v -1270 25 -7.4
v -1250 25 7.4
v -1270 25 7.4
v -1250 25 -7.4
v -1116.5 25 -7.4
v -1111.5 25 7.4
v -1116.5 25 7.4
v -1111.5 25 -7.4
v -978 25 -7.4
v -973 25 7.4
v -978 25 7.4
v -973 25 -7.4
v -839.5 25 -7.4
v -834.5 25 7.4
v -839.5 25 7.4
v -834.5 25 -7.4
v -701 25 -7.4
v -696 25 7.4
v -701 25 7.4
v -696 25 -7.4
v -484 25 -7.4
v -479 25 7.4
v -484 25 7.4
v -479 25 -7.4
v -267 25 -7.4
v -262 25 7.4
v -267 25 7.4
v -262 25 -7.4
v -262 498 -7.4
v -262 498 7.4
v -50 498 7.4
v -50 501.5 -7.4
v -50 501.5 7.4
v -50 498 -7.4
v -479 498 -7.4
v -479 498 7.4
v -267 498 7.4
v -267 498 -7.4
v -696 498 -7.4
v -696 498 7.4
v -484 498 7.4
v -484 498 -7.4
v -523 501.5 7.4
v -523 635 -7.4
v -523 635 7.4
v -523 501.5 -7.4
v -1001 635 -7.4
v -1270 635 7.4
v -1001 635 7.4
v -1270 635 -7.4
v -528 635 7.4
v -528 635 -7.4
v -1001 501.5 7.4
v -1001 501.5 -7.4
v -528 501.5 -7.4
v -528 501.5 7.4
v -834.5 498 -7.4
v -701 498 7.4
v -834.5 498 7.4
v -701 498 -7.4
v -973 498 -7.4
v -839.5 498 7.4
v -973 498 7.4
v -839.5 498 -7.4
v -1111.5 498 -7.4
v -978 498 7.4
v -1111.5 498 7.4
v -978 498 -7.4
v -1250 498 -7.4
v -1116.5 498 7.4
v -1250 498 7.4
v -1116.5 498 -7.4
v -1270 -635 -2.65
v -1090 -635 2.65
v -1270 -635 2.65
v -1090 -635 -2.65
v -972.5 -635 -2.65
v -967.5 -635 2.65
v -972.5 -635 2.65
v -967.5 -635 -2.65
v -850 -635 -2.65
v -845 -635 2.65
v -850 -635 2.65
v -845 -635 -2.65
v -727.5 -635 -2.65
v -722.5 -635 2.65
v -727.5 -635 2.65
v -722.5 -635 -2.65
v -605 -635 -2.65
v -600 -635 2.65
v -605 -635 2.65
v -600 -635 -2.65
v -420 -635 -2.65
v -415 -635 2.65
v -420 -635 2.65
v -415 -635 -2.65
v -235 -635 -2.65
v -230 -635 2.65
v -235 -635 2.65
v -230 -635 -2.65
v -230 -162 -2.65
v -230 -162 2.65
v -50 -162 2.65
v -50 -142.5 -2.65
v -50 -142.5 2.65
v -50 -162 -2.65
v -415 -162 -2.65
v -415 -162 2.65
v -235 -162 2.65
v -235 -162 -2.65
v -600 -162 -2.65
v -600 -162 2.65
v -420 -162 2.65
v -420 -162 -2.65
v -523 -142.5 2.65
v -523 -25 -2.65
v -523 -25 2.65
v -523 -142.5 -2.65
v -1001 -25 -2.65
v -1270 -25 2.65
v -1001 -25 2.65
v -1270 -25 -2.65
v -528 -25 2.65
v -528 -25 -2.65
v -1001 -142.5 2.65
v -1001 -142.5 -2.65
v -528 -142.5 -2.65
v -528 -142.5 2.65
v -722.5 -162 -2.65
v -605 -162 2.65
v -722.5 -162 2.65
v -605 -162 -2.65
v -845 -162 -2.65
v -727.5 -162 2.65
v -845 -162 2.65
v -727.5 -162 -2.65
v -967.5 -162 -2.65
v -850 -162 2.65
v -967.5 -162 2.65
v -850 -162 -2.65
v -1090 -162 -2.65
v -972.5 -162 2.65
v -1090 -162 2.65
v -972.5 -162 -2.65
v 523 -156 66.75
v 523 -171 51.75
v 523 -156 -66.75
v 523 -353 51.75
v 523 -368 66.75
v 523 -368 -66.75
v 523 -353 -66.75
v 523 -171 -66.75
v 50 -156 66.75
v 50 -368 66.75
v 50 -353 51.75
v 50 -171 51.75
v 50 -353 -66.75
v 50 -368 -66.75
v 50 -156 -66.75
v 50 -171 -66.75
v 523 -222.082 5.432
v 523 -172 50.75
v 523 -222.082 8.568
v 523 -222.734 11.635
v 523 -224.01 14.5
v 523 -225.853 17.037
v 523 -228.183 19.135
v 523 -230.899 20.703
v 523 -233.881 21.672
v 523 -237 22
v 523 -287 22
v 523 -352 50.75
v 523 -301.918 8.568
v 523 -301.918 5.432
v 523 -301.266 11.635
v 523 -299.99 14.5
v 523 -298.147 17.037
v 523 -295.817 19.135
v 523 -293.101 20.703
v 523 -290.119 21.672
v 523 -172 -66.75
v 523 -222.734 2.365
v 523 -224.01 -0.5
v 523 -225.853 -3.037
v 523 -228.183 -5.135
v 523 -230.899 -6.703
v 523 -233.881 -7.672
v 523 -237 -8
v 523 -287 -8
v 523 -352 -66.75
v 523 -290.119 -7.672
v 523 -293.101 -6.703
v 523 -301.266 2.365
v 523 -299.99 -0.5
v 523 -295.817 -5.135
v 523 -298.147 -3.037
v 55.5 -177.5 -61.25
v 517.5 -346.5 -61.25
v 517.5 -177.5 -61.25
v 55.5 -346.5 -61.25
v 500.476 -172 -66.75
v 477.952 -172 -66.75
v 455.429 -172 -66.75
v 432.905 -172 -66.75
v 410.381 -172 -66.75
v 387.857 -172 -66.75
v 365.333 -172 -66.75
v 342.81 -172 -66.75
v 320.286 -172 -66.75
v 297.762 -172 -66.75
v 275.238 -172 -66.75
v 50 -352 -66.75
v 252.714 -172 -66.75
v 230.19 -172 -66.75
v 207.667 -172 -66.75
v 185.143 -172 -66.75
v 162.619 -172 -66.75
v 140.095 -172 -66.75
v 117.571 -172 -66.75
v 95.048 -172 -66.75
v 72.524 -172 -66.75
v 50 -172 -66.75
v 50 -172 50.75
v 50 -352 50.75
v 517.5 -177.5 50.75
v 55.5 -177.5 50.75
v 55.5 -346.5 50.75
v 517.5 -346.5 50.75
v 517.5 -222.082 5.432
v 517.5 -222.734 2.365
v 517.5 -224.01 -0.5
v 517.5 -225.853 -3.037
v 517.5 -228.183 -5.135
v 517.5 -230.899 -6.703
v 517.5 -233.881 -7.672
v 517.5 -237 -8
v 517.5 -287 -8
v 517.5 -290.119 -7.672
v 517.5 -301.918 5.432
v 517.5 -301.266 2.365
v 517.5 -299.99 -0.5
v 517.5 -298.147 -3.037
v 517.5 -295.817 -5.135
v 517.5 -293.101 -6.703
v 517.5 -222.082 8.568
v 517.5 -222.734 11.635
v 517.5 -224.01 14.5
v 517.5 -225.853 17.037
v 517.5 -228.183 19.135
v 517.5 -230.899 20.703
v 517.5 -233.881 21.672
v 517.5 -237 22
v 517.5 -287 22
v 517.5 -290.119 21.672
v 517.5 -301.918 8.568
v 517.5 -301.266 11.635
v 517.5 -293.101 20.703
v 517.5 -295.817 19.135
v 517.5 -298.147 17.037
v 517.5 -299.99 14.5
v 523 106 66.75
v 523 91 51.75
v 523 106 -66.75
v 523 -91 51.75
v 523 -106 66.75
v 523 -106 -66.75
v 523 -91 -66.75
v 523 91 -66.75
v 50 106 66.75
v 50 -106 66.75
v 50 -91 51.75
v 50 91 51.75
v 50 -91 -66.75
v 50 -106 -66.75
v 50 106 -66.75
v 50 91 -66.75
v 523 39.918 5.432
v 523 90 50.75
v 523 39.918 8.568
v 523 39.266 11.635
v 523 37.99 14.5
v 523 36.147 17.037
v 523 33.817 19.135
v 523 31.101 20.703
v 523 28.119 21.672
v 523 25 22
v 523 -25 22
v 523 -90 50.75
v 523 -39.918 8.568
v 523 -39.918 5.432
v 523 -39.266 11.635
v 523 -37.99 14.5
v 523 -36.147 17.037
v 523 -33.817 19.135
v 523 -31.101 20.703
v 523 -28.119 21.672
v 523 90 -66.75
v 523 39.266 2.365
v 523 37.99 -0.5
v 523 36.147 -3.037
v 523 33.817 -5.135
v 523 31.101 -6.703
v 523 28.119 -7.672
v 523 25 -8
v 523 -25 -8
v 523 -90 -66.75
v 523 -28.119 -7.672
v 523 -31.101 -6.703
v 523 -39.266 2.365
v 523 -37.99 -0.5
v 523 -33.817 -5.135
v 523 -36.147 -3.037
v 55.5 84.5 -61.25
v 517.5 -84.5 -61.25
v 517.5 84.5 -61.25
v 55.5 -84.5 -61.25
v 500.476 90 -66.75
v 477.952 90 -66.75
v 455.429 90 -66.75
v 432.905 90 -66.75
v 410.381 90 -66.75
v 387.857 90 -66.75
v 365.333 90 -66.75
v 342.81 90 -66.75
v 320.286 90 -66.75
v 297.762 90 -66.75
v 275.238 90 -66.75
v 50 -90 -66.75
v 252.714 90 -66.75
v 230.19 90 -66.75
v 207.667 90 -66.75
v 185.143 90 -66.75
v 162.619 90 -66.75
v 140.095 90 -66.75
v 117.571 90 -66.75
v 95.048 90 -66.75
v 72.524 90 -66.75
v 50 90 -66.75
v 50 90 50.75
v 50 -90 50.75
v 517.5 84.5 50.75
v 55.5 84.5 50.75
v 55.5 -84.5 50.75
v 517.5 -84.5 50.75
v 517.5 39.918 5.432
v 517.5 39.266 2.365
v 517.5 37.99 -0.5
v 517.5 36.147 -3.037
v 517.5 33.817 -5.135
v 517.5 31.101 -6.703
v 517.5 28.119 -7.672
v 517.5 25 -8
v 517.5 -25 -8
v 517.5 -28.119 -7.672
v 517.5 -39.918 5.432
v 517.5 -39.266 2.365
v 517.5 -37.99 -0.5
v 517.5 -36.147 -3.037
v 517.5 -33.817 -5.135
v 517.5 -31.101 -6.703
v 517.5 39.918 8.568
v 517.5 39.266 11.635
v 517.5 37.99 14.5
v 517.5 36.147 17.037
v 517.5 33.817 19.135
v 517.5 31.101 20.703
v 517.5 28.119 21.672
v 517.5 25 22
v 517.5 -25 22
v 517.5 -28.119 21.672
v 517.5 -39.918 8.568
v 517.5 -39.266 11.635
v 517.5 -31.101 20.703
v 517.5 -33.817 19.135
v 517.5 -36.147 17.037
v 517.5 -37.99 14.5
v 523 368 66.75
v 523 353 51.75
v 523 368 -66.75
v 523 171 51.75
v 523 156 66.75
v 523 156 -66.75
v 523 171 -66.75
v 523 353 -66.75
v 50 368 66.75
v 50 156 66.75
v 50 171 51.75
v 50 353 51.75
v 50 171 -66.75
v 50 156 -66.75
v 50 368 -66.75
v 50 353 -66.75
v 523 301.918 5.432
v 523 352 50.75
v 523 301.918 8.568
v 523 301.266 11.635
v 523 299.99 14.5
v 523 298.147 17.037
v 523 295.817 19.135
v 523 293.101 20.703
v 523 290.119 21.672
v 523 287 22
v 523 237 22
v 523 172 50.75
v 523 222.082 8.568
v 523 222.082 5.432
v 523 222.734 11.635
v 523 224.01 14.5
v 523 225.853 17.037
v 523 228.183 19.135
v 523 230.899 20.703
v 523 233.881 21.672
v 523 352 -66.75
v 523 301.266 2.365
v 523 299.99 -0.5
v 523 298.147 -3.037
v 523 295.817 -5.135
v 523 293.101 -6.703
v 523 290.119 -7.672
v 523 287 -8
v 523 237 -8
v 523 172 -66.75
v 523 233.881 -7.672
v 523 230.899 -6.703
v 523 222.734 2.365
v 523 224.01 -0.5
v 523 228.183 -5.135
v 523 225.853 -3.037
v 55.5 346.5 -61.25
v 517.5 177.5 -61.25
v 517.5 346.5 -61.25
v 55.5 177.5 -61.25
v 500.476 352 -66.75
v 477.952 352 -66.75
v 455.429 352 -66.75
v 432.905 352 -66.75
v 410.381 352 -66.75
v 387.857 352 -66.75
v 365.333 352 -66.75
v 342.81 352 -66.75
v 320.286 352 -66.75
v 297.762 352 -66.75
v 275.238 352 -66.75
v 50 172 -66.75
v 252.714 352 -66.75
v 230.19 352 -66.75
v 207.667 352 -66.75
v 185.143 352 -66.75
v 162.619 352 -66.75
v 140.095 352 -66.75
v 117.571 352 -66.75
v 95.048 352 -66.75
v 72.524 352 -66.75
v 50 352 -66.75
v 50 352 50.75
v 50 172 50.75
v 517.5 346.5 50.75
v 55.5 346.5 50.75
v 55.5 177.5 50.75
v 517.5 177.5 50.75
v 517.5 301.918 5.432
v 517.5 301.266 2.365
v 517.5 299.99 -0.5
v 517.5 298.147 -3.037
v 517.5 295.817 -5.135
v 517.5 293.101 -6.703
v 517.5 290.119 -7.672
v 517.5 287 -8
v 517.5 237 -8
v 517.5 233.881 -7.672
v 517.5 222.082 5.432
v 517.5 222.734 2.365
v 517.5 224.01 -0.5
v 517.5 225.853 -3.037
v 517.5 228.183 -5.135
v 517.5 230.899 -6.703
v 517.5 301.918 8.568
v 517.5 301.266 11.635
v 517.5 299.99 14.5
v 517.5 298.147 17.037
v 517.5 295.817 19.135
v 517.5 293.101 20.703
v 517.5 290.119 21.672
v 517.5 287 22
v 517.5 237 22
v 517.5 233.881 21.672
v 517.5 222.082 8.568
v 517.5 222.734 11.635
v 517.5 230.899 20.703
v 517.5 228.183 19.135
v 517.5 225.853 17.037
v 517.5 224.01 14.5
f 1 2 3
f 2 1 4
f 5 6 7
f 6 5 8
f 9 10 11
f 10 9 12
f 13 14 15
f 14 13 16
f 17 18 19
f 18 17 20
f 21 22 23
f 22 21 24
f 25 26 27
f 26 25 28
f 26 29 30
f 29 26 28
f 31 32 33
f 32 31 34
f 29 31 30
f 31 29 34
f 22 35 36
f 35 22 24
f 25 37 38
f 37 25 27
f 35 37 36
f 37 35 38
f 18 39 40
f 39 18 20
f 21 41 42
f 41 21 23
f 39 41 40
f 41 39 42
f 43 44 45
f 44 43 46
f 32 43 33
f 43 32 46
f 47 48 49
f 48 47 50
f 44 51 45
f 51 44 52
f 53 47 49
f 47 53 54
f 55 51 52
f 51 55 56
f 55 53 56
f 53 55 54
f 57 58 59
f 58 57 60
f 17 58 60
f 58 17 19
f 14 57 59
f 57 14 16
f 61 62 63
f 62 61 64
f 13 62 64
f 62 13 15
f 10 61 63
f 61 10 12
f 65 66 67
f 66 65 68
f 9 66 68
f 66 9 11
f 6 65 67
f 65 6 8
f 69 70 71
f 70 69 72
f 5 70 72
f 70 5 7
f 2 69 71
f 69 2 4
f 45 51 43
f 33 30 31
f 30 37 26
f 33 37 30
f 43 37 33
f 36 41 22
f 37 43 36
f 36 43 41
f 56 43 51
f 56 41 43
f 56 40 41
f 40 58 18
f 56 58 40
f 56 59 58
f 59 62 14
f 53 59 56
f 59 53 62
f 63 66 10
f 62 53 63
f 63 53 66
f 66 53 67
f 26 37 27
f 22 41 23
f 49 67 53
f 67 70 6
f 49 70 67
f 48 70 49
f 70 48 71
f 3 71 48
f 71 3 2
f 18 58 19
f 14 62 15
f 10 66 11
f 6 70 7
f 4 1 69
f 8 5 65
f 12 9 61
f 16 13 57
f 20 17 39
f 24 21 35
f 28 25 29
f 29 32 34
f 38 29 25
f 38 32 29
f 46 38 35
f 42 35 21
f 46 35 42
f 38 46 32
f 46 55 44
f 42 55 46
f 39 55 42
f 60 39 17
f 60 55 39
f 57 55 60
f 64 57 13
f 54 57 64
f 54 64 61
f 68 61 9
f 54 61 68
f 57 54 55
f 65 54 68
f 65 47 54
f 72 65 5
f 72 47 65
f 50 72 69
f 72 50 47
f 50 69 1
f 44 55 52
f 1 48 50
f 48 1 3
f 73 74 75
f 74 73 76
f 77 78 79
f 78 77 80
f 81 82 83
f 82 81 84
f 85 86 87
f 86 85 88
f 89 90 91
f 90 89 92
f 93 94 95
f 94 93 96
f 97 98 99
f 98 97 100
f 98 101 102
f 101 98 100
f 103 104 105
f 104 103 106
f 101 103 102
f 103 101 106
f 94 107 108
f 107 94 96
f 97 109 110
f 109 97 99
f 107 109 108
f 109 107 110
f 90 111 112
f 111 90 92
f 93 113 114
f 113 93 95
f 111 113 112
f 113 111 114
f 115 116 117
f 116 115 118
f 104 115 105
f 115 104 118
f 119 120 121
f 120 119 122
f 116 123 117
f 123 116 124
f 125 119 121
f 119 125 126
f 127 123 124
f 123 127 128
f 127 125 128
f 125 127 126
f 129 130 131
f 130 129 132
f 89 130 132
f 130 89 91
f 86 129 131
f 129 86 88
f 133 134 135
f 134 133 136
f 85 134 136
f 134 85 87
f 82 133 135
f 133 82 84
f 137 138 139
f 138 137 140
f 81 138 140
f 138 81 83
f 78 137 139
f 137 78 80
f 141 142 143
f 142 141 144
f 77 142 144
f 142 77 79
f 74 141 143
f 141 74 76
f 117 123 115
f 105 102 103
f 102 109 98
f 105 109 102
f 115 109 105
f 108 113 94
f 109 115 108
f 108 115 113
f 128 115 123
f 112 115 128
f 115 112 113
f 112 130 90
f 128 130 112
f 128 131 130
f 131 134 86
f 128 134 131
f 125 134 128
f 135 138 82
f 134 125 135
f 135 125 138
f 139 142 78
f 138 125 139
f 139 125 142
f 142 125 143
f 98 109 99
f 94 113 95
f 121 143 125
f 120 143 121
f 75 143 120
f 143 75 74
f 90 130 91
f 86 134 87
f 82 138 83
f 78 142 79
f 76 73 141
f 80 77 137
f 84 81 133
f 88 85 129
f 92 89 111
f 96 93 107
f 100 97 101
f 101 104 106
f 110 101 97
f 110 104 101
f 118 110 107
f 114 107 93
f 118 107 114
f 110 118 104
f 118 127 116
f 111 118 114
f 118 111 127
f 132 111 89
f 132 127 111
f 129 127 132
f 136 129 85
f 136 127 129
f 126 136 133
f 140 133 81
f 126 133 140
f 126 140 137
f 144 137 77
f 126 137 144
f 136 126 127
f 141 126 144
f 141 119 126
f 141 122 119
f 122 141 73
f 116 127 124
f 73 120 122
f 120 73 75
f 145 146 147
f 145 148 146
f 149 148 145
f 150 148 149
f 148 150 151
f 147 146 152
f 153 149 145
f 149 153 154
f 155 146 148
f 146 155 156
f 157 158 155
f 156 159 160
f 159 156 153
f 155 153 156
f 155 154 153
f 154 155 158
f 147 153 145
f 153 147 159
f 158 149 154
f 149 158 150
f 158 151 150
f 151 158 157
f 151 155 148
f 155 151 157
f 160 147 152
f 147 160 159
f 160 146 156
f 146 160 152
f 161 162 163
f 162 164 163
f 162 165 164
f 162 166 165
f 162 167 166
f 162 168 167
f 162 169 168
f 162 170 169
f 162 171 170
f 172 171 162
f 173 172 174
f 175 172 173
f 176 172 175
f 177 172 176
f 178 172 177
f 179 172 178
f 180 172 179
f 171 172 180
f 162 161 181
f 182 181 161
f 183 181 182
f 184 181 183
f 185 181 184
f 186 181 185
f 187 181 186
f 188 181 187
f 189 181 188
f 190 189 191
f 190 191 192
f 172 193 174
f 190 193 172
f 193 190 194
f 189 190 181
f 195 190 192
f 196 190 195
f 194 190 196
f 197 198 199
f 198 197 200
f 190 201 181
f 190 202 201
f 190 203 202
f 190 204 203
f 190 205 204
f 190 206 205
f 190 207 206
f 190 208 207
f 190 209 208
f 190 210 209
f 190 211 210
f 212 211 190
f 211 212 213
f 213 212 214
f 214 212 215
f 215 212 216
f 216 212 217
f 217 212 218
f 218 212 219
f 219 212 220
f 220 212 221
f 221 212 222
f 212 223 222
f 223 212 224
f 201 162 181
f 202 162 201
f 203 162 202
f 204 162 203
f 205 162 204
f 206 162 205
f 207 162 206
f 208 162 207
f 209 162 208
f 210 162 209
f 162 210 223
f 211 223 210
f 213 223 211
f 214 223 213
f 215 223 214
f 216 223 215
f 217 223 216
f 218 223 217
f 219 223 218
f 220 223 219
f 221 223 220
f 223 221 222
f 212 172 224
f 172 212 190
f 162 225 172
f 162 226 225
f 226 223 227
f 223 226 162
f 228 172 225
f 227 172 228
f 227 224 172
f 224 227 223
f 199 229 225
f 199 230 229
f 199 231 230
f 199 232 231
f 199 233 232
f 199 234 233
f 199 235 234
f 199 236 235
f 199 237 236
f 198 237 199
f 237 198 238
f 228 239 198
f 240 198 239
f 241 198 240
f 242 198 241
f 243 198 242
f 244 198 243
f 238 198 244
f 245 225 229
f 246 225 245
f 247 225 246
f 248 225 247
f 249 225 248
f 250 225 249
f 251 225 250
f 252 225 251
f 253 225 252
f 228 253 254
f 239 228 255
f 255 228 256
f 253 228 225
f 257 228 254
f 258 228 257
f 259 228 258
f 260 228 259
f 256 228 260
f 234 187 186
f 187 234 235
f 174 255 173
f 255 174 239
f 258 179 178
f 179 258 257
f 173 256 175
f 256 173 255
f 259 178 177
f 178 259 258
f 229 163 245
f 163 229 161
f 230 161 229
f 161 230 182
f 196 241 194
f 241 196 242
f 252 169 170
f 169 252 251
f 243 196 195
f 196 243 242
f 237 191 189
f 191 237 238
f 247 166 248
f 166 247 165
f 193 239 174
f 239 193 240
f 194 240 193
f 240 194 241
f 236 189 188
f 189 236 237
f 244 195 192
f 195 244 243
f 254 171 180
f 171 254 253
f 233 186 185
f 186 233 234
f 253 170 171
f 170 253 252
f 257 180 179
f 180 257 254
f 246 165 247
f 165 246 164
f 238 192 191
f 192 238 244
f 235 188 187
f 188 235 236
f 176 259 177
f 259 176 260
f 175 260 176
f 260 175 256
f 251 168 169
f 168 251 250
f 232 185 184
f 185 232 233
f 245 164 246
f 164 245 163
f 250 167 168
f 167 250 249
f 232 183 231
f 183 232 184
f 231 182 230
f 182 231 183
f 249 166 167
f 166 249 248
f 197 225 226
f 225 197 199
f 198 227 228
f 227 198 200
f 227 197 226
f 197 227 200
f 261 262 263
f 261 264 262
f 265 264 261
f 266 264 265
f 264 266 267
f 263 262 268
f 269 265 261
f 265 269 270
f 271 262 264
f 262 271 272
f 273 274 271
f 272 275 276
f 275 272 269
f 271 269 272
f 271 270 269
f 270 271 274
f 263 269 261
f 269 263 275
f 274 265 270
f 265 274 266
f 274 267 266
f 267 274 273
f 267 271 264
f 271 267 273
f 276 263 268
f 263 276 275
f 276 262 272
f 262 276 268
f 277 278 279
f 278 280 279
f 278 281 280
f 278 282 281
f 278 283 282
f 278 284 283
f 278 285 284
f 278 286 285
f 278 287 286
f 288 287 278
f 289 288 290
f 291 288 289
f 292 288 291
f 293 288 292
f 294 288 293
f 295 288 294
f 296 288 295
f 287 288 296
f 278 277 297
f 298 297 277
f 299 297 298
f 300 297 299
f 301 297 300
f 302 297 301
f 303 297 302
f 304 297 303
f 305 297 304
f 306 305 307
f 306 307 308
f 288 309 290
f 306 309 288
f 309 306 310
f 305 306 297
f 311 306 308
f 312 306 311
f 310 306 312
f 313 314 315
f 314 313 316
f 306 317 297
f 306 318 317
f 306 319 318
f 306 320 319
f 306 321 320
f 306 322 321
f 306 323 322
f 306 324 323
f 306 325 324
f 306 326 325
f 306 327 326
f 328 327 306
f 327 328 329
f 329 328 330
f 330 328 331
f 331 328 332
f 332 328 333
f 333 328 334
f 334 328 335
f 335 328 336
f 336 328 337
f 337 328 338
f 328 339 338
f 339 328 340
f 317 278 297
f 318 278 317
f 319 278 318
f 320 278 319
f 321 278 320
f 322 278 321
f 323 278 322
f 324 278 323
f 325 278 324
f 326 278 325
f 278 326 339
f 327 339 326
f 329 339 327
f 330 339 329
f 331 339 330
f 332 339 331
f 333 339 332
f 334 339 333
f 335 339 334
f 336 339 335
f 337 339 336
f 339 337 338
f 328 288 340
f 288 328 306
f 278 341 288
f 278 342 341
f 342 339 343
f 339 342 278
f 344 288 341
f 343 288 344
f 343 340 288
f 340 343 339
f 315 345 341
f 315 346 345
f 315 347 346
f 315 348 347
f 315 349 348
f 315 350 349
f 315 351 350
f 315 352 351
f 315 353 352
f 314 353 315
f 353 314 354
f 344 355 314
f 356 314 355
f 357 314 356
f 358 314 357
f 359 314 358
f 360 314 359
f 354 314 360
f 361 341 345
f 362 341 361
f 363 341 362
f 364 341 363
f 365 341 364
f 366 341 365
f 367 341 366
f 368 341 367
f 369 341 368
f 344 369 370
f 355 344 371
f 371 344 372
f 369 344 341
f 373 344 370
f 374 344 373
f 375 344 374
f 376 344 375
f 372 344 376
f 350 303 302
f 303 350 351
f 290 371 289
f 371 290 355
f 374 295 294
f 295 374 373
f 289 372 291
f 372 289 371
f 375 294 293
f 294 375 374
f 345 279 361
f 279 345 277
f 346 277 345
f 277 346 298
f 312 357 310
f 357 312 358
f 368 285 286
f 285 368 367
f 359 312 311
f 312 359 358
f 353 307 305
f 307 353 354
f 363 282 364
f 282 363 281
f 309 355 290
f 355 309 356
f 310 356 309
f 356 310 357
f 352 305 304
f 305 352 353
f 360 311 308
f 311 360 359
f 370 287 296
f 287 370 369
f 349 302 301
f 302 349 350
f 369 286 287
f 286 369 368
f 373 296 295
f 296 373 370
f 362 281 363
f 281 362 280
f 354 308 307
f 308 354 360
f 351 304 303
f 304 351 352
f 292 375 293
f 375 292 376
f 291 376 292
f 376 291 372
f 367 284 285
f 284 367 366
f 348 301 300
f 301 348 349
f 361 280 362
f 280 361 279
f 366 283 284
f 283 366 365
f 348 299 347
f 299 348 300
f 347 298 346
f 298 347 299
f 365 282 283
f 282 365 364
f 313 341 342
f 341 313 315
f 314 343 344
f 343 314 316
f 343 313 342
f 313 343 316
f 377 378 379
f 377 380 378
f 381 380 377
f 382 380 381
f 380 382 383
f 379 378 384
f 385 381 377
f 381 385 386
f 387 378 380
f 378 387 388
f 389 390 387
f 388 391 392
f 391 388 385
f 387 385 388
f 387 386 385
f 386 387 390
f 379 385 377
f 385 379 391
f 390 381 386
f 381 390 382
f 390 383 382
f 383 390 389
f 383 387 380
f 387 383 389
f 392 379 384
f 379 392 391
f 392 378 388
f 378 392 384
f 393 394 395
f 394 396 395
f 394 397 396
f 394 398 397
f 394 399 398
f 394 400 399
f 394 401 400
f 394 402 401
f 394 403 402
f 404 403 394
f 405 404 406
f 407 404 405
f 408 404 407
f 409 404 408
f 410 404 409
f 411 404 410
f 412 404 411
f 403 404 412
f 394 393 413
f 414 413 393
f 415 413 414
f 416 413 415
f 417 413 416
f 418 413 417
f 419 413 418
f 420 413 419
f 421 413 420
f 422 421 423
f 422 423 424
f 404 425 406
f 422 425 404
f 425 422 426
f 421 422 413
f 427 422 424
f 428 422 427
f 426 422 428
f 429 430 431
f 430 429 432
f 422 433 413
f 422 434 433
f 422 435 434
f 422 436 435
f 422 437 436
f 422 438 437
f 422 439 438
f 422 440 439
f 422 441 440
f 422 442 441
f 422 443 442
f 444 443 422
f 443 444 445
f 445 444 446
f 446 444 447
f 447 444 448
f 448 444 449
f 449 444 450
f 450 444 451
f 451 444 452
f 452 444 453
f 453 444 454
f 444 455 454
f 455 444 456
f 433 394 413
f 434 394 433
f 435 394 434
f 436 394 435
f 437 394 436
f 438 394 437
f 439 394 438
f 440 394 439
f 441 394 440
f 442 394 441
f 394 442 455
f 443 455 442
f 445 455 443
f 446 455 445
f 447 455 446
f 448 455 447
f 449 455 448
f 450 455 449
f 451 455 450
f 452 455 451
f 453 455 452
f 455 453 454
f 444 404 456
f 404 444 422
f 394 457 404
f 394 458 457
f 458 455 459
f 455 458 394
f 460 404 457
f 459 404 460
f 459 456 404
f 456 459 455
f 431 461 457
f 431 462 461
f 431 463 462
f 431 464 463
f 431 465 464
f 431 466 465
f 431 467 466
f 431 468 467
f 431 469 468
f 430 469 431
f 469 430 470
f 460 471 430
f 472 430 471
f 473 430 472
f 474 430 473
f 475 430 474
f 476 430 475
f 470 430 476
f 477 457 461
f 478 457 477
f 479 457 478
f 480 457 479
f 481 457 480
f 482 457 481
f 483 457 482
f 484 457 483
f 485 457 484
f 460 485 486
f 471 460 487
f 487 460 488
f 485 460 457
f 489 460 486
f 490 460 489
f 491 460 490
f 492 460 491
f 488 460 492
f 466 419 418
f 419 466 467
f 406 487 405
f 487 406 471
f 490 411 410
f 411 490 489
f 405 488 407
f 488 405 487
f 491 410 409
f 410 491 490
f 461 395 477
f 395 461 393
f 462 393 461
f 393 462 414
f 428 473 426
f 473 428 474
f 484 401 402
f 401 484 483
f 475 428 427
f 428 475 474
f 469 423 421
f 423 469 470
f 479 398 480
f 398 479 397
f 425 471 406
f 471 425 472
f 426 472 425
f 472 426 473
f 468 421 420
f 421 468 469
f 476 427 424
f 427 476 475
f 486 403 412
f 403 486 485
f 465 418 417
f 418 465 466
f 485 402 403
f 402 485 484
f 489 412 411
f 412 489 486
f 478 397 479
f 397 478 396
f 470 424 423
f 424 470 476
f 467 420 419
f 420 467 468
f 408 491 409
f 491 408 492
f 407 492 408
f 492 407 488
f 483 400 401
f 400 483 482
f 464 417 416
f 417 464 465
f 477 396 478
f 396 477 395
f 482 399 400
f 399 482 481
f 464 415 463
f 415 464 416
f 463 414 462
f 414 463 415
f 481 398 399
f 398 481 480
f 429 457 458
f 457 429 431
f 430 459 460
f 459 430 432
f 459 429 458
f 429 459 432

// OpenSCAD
gridfinityUnit = 42;
gridfinityHeightUnit = 7;

plankThickness = 15;
drawerPlankThickness = 5.5;
drawerTolerance = 1;

internalDepth = 4*gridfinityUnit+1;
internalWidth = 11*gridfinityUnit+1;
internalHeight = 16*gridfinityHeightUnit;

depth = internalDepth + 2*plankThickness + 2*drawerPlankThickness + 2*drawerTolerance;
width = 11*gridfinityUnit + 2*drawerPlankThickness;
height = internalHeight + drawerPlankThickness + drawerTolerance + plankThickness;


drawerDepth = depth - 2 * plankThickness - 2 * drawerTolerance;
drawerHeight = height - plankThickness - drawerTolerance;

echo(internalDepth, internalWidth, internalHeight);

handleRadius = 15;
handleWidth = 80;
handleVerticalOffset = 15;

jointFingers = 10;
fingerWidth = width / (2*jointFingers+1);

module finger(th = 5,odd = 0) {
  thickness = th + 2;
  offset = odd == 0 ? 0 : fingerWidth;
  
  for (i = [0:1:jointFingers]) {
    translate([-width/2+i*fingerWidth*2+fingerWidth/2+offset,0,0]) {
      cube([fingerWidth, thickness, thickness], center=true);
    }
  }
}

module shelf() {
  translate([0,0,height/2-plankThickness/2]) {
    cube([width, depth, plankThickness], center=true);
  }
  
  translate([0,-depth/2+plankThickness/2,0]) {
    cube([width, plankThickness, height], center=true);
  }
  
  translate([0,depth/2-plankThickness/2,0]) {
    cube([width, plankThickness, height], center=true);
  }
}

module handle() {
  rotate([0,90,0]) {
    hull() {
      translate([0,-(handleWidth-2*handleRadius)/2,0]) {
        cylinder(30, handleRadius, handleRadius, center=true);
      }
      translate([0,(handleWidth-2*handleRadius)/2,0]) {
        cylinder(30, handleRadius, handleRadius, center=true);
      }
    }
  }
}

module drawer() {
  color("brown") {
    difference(){
      translate([0,0,-height/2+drawerPlankThickness/2]) {
        cube([width, drawerDepth, drawerPlankThickness],center=true);
      }
      translate([0,drawerDepth/2-drawerPlankThickness/2+1, -height/2+drawerPlankThickness/2-1]) {
        finger(5,1);
      }
    }
  }

  
  translate([width/2-drawerPlankThickness/2,0,-(height-drawerHeight)/2]) {
      
    difference() {
      cube([drawerPlankThickness, drawerDepth, drawerHeight], center=true);
      translate([0,0,handleVerticalOffset]) {
        handle();
      }
    }

  }
  
  translate([-(width/2-drawerPlankThickness/2),0,-(height-drawerHeight)/2]) {
    cube([drawerPlankThickness, drawerDepth, drawerHeight], center=true);
  }
  
  difference() {
    translate([0,depth/2-plankThickness-drawerTolerance-drawerPlankThickness/2,-(height-drawerHeight)/2]) {
      cube([width, drawerPlankThickness,drawerHeight], center=true);
    }
    
    translate([0,drawerDepth/2-drawerPlankThickness/2, -height/2+drawerPlankThickness/2-1]) {
      finger();
    }
  }
  
  difference() {
    translate([0,-(depth/2-plankThickness-drawerTolerance-drawerPlankThickness/2),-(height-drawerHeight)/2]) {
      cube([width, drawerPlankThickness,drawerHeight], center=true);
    }
    
    translate([0,-drawerDepth/2+drawerPlankThickness/2, -height/2+drawerPlankThickness/2-1]) {
      finger();
    }
  }
}

module stockSheet(thickness=15) {
  sheetWidth = 1220;
  sheetDepth = 610;
  
  cube([sheetWidth, sheetDepth, thickness-0.2], center=true);
}

module flatShelf() {
  cutWidth = 5;
  
  width = width;
  depth = depth;
  height = height;
  plankThickness = plankThickness;
  
  
  echo(610-width);
  #translate([1220/2-depth/2,-(610-width)/2,0]) {
    rotate([0,0,90]) {
      cube([width, depth, plankThickness], center=true);
    }
  }
  
  #translate([1220/2-depth/2-(depth+cutWidth),-(610-width)/2,0]) {
    rotate([0,0,90]) {
      cube([width, depth, plankThickness], center=true);
    }
  }
  
  #translate([1220/2-depth/2-2*(depth+cutWidth),-(610-width)/2,0]) {
    rotate([0,0,90]) {
      cube([width, depth, plankThickness], center=true);
    }
  }
  
  #translate([1220/2-width/2,610/2-(height/2),0]) {
    rotate([90,0,0]) {
      cube([width, plankThickness, height], center=true);
    }
  }
  #translate([1220/2-width/2-(width+cutWidth),610/2-(height/2),0]) {
    rotate([90,0,0]) {
      cube([width, plankThickness, height], center=true);
    }
  }
  #translate([1220/2-height/2-3*(depth+cutWidth),-(610-width)/2,0]) {
    rotate([90,0,90]) {
      cube([width, plankThickness, height], center=true);
    }
  }
  #translate([1220/2-height/2-3*(depth+cutWidth)-(height+cutWidth),-(610-width)/2,0]) {
    rotate([90,0,90]) {
      cube([width, plankThickness, height], center=true);
    }
  }
  #translate([1220/2-height/2-3*(depth+cutWidth)-2*(height+cutWidth),-(610-width)/2,0]) {
    rotate([90,0,90]) {
      cube([width, plankThickness, height], center=true);
    }
  }
  #translate([1220/2-height/2-3*(depth+cutWidth)-3*(height+cutWidth),-(610-width)/2,0]) {
    rotate([90,0,90]) {
      cube([width, plankThickness, height], center=true);
    }
  }
}


module flatDrawer() {
  cutWidth = 5;
  
  width = width;
  depth = drawerDepth;
  height = drawerHeight;
  plankThickness = drawerPlankThickness;
  
  
  echo(610-width);
  #translate([1220/2-depth/2,-(610-width)/2,0]) {
    rotate([0,0,90]) {
      cube([width, depth, plankThickness], center=true);
    }
  }
  
  #translate([1220/2-depth/2-(depth+cutWidth),-(610-width)/2,0]) {
    rotate([0,0,90]) {
      cube([width, depth, plankThickness], center=true);
    }
  }
  
  #translate([1220/2-depth/2-2*(depth+cutWidth),-(610-width)/2,0]) {
    rotate([0,0,90]) {
      cube([width, depth, plankThickness], center=true);
    }
  }
  
  #translate([1220/2-width/2,610/2-(height/2),0]) {
    rotate([90,0,0]) {
      cube([width, plankThickness, height], center=true);
    }
  }
  #translate([1220/2-width/2-(width+cutWidth),610/2-(height/2),0]) {
    rotate([90,0,0]) {
      cube([width, plankThickness, height], center=true);
    }
  }
  #translate([1220/2-height/2-3*(depth+cutWidth),-(610-width)/2,0]) {
    rotate([90,0,90]) {
      cube([width, plankThickness, height], center=true);
    }
  }
  #translate([1220/2-height/2-3*(depth+cutWidth)-(height+cutWidth),-(610-width)/2,0]) {
    rotate([90,0,90]) {
      cube([width, plankThickness, height], center=true);
    }
  }
  #translate([1220/2-height/2-3*(depth+cutWidth)-2*(height+cutWidth),-(610-width)/2,0]) {
    rotate([90,0,90]) {
      cube([width, plankThickness, height], center=true);
    }
  }
  #translate([1220/2-height/2-3*(depth+cutWidth)-3*(height+cutWidth),-(610-width)/2,0]) {
    rotate([90,0,90]) {
      cube([width, plankThickness, height], center=true);
    }
  }
}

module sheetLayout() {
  gap = 25;
  translate([0,610/2+gap,0]) {
    difference() {
      stockSheet();
      flatShelf();
    }
  }
  
  translate([0,-(610/2+gap),0]) {
    difference() {
      stockSheet(5.5);
      flatDrawer();
    }
  }
}

gap = 50;

translate([-(1220/2+gap),0,0]) {
  sheetLayout();
}

translate([width/2+gap,-depth-gap,0]) {
  color("red",0.5) {
    shelf();
  }
  color("yellow",0.5) {
    drawer();
  }
}

translate([width/2+gap,0,0]) {
  color("red",0.5) {
    shelf();
  }
  color("yellow",0.5) {
    drawer();
  }
}

translate([width/2+gap,depth+gap,0]) {
  color("red",0.5) {
    shelf();
  }
  color("yellow",0.5) {
    drawer();
  }
}
